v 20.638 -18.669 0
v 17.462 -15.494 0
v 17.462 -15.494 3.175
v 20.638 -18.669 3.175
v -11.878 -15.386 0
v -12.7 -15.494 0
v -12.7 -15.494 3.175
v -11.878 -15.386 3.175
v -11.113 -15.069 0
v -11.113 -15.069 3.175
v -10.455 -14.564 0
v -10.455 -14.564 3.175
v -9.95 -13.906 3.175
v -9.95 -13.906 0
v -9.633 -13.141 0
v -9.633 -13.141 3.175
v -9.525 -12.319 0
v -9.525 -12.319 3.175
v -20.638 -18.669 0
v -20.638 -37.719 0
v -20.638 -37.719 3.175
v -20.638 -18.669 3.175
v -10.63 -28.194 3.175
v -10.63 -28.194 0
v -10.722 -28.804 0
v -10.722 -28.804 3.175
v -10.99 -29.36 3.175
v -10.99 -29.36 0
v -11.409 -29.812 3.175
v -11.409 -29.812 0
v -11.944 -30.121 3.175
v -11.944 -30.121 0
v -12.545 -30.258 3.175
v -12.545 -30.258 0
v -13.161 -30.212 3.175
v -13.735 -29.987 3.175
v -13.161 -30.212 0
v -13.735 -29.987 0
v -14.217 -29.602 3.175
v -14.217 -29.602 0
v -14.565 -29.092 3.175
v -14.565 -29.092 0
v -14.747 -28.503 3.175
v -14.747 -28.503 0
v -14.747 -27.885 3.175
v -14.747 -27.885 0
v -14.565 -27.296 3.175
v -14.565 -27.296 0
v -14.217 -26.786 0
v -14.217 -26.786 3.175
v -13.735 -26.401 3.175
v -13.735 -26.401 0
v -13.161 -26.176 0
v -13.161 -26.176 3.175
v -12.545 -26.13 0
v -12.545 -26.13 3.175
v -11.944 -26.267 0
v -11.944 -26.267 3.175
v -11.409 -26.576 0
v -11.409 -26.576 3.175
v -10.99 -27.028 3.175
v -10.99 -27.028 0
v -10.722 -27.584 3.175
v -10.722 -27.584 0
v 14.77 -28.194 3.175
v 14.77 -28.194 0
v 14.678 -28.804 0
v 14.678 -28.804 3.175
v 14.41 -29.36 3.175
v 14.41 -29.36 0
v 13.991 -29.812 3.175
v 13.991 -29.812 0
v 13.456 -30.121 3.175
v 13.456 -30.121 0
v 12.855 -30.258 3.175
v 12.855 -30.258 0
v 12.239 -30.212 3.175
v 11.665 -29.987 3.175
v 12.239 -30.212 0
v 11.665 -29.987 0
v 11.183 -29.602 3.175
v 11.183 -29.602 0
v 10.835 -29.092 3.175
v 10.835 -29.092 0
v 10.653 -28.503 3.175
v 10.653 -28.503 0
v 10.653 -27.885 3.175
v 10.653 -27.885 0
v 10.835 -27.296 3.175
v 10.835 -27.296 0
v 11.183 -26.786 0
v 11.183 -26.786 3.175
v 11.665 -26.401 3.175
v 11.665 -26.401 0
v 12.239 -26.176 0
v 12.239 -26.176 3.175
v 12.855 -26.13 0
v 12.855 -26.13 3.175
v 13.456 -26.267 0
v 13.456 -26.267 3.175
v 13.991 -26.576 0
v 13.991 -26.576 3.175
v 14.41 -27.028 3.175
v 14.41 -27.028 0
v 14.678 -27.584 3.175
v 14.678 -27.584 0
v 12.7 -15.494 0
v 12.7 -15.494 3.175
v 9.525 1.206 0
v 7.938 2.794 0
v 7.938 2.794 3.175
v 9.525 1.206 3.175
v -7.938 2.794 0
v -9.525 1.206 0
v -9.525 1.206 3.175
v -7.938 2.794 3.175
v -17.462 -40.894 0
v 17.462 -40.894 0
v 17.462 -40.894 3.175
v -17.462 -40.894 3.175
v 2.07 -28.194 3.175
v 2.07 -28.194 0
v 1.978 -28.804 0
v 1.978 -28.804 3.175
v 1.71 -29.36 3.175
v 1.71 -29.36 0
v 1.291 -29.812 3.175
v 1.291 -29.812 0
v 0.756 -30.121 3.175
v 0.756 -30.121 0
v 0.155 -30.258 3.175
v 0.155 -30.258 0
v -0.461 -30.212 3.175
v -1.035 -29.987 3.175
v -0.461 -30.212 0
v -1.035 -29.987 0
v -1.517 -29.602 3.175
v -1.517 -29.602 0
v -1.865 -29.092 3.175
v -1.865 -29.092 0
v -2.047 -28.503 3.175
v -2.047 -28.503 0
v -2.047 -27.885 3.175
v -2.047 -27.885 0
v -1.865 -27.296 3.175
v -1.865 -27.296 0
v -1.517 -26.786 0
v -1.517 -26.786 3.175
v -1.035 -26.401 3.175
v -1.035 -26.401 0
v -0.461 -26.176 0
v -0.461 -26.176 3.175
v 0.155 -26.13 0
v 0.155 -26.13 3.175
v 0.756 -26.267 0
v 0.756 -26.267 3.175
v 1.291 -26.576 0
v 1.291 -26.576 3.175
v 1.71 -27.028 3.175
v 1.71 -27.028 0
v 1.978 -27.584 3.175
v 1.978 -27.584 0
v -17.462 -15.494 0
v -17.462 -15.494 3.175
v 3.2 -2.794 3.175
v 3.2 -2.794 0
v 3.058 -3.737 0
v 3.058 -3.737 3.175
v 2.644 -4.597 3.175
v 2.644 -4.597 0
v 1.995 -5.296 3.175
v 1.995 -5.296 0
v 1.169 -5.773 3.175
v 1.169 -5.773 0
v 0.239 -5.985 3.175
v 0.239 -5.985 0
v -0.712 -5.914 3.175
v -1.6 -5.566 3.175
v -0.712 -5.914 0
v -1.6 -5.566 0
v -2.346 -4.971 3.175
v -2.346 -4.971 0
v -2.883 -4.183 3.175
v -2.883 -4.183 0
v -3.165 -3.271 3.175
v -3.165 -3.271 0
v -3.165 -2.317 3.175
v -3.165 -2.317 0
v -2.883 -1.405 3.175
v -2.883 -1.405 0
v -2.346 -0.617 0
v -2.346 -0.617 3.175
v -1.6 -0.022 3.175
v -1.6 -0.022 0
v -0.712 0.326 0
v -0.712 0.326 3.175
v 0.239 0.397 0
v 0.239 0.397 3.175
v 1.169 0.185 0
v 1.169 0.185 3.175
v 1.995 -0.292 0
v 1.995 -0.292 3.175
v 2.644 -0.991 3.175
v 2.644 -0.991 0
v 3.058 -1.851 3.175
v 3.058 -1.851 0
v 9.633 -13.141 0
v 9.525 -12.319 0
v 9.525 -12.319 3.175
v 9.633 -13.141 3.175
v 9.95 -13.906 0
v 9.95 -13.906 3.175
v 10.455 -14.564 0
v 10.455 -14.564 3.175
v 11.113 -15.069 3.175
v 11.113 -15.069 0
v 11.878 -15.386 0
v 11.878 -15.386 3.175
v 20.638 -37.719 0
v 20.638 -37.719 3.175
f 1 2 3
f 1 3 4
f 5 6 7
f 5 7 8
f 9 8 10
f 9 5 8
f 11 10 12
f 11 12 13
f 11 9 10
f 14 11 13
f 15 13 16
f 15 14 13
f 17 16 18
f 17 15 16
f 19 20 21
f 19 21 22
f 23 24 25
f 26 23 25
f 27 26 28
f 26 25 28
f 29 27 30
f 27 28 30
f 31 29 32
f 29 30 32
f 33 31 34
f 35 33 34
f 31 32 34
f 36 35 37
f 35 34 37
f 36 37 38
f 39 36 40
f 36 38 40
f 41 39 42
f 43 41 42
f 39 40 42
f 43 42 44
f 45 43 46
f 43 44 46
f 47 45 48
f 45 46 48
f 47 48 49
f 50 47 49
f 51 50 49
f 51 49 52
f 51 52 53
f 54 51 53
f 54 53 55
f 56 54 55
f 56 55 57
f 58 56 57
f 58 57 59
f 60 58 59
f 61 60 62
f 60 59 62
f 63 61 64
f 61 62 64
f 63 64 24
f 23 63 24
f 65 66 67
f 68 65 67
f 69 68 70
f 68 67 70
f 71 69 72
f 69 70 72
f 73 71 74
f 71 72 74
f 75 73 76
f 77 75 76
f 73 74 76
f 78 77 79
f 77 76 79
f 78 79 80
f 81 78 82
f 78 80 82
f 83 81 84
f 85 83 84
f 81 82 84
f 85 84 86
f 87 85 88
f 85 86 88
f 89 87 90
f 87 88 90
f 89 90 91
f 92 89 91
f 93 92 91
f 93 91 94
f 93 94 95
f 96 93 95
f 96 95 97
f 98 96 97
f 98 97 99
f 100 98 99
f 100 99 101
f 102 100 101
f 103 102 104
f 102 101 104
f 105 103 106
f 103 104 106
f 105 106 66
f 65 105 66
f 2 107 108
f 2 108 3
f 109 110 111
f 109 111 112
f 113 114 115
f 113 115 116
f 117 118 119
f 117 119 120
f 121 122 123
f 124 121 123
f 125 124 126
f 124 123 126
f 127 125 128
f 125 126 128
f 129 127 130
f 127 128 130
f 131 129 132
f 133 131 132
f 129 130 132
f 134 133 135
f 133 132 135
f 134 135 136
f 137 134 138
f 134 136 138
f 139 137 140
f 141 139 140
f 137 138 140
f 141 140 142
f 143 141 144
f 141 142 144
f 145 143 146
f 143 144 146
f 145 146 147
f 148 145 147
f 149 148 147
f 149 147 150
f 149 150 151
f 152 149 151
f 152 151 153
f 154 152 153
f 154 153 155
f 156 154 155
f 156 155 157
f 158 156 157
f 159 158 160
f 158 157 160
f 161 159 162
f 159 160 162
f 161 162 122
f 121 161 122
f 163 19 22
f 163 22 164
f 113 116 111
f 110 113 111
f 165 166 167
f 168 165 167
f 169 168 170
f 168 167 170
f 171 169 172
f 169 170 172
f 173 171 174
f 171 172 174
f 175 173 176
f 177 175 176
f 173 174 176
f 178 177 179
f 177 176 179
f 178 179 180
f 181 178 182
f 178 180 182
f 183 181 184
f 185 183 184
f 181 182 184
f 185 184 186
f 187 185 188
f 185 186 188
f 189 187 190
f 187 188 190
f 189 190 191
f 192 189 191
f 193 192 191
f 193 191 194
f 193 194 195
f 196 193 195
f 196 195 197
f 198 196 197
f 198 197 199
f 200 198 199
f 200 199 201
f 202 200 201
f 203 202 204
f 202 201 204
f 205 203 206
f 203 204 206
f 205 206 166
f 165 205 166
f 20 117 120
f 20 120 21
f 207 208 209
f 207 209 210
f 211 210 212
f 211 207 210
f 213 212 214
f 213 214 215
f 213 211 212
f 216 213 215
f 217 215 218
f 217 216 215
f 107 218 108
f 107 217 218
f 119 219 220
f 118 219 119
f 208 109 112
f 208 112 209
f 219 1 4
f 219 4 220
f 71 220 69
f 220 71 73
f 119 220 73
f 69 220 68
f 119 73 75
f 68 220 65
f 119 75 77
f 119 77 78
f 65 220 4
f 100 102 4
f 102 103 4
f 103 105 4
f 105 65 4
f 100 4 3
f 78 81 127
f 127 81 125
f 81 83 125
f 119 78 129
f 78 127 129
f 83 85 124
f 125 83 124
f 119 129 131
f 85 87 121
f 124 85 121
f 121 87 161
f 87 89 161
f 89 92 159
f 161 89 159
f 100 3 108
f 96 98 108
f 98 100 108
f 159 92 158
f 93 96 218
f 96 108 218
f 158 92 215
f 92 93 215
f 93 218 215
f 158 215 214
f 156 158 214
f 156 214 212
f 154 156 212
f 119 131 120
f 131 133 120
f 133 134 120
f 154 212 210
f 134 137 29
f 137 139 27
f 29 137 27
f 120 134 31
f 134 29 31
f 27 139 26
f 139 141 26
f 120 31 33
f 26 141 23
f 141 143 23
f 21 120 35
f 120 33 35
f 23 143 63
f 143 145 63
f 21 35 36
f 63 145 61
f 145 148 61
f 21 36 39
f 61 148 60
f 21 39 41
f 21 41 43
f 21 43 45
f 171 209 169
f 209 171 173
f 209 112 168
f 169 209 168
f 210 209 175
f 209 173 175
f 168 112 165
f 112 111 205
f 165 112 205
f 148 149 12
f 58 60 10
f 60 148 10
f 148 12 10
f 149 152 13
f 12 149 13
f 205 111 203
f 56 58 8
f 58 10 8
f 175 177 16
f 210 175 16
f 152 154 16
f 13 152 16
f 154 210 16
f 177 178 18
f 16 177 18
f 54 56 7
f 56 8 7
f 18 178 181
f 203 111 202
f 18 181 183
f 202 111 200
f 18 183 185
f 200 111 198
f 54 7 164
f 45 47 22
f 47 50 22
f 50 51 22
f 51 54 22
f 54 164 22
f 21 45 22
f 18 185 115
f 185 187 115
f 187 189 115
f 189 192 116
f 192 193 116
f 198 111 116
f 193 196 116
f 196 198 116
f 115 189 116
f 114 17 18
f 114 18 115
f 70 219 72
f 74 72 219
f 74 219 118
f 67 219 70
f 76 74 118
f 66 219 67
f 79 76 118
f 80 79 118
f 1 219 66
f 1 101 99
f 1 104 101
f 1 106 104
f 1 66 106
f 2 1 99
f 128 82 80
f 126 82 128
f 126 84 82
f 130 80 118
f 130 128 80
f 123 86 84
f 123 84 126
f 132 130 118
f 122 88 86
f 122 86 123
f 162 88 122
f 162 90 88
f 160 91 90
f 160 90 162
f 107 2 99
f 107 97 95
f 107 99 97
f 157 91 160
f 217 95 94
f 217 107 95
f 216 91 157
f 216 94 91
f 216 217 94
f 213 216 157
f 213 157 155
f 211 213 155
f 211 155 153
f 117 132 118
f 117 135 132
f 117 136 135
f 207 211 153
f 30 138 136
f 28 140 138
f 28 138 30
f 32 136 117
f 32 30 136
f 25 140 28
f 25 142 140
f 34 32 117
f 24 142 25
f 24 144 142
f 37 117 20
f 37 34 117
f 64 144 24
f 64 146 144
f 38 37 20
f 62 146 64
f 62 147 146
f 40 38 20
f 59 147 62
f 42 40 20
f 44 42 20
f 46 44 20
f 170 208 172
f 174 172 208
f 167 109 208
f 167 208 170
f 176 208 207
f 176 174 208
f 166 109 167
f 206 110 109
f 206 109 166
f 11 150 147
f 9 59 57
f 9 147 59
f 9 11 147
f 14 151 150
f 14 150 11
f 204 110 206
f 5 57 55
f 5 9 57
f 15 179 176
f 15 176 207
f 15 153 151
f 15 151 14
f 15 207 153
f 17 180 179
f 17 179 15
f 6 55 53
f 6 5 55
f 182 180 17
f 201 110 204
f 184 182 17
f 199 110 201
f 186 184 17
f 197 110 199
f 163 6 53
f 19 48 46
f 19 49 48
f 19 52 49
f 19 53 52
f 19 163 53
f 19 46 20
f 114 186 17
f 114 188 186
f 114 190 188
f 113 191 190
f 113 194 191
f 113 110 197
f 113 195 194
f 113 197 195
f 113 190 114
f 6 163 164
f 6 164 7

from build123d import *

# Parameters (mm, degrees)
SKETCH1_R           = 3.2004
SKETCH1_R_2         = 2.0701
BOSS_EXTRUDE1_DEPTH = 3.175
SKETCH2_W           = 33.106994052
SKETCH2_H           = 45.21414564
CUT_EXTRUDE1_DEPTH  = 46.916296315


with BuildPart() as part:
    # Sketch1 → Boss-Extrude1 (new body)
    with BuildSketch(Plane(origin=(0, 0, 0), x_dir=(-1, 0, 0), z_dir=(0, 0, -1))):
        with BuildLine():
            Line((-17.4625, -15.494), (-20.6375, -18.669))
            Line((-20.6375, -18.669), (-20.6375, -37.719))
            Line((-20.6375, -37.719), (-17.4625, -40.894))
            Line((-17.4625, -40.894), (17.4625, -40.894))
            Line((17.4625, -40.894), (20.6375, -37.719))
            Line((20.6375, -37.719), (20.6375, -18.669))
            Line((20.6375, -18.669), (17.4625, -15.494))
            Line((17.4625, -15.494), (12.7, -15.494))
            ThreePointArc((12.7, -15.494), (10.45493597, -14.56406403), (9.525, -12.319))
            Line((9.525, -12.319), (9.525, 1.2065))
            Line((9.525, 1.2065), (7.9375, 2.794))
            Line((7.9375, 2.794), (9.525, 4.3815))
            Line((9.525, 4.3815), (9.525, 37.719))
            Line((9.525, 37.719), (6.35, 40.894))
            Line((6.35, 40.894), (-6.35, 40.894))
            Line((-6.35, 40.894), (-9.525, 37.719))
            Line((-9.525, 37.719), (-9.525, 4.3815))
            Line((-9.525, 4.3815), (-7.9375, 2.794))
            Line((-7.9375, 2.794), (-9.525, 1.2065))
            Line((-9.525, 1.2065), (-9.525, -12.319))
            ThreePointArc((-9.525, -12.319), (-10.45493597, -14.56406403), (-12.7, -15.494))
            Line((-12.7, -15.494), (-17.4625, -15.494))
        make_face()
        with Locations(Location((0, 35.306, 0), (0, 0, 180))):
            Circle(SKETCH1_R, mode=Mode.SUBTRACT)
        with Locations(Location((0, -2.794, 0), (0, 0, 180))):
            Circle(SKETCH1_R, mode=Mode.SUBTRACT)
        with Locations(Location((12.7, -28.194, 0), (0, 0, 180))):
            Circle(SKETCH1_R_2, mode=Mode.SUBTRACT)
        with Locations(Location((-12.7, -28.194, 0), (0, 0, 180))):
            Circle(SKETCH1_R_2, mode=Mode.SUBTRACT)
        with Locations(Location((0, -28.194, 0), (0, 0, 180))):
            Circle(SKETCH1_R_2, mode=Mode.SUBTRACT)
    extrude(amount=-BOSS_EXTRUDE1_DEPTH)

    # Sketch2 → Cut-Extrude1 (cut, through all)
    with BuildSketch(Plane.XY.offset(3.175)):
        with Locations((5.708102423, 25.40107282)):
            Rectangle(SKETCH2_W, SKETCH2_H)
    extrude(amount=-CUT_EXTRUDE1_DEPTH, mode=Mode.SUBTRACT)


solid = part.part
